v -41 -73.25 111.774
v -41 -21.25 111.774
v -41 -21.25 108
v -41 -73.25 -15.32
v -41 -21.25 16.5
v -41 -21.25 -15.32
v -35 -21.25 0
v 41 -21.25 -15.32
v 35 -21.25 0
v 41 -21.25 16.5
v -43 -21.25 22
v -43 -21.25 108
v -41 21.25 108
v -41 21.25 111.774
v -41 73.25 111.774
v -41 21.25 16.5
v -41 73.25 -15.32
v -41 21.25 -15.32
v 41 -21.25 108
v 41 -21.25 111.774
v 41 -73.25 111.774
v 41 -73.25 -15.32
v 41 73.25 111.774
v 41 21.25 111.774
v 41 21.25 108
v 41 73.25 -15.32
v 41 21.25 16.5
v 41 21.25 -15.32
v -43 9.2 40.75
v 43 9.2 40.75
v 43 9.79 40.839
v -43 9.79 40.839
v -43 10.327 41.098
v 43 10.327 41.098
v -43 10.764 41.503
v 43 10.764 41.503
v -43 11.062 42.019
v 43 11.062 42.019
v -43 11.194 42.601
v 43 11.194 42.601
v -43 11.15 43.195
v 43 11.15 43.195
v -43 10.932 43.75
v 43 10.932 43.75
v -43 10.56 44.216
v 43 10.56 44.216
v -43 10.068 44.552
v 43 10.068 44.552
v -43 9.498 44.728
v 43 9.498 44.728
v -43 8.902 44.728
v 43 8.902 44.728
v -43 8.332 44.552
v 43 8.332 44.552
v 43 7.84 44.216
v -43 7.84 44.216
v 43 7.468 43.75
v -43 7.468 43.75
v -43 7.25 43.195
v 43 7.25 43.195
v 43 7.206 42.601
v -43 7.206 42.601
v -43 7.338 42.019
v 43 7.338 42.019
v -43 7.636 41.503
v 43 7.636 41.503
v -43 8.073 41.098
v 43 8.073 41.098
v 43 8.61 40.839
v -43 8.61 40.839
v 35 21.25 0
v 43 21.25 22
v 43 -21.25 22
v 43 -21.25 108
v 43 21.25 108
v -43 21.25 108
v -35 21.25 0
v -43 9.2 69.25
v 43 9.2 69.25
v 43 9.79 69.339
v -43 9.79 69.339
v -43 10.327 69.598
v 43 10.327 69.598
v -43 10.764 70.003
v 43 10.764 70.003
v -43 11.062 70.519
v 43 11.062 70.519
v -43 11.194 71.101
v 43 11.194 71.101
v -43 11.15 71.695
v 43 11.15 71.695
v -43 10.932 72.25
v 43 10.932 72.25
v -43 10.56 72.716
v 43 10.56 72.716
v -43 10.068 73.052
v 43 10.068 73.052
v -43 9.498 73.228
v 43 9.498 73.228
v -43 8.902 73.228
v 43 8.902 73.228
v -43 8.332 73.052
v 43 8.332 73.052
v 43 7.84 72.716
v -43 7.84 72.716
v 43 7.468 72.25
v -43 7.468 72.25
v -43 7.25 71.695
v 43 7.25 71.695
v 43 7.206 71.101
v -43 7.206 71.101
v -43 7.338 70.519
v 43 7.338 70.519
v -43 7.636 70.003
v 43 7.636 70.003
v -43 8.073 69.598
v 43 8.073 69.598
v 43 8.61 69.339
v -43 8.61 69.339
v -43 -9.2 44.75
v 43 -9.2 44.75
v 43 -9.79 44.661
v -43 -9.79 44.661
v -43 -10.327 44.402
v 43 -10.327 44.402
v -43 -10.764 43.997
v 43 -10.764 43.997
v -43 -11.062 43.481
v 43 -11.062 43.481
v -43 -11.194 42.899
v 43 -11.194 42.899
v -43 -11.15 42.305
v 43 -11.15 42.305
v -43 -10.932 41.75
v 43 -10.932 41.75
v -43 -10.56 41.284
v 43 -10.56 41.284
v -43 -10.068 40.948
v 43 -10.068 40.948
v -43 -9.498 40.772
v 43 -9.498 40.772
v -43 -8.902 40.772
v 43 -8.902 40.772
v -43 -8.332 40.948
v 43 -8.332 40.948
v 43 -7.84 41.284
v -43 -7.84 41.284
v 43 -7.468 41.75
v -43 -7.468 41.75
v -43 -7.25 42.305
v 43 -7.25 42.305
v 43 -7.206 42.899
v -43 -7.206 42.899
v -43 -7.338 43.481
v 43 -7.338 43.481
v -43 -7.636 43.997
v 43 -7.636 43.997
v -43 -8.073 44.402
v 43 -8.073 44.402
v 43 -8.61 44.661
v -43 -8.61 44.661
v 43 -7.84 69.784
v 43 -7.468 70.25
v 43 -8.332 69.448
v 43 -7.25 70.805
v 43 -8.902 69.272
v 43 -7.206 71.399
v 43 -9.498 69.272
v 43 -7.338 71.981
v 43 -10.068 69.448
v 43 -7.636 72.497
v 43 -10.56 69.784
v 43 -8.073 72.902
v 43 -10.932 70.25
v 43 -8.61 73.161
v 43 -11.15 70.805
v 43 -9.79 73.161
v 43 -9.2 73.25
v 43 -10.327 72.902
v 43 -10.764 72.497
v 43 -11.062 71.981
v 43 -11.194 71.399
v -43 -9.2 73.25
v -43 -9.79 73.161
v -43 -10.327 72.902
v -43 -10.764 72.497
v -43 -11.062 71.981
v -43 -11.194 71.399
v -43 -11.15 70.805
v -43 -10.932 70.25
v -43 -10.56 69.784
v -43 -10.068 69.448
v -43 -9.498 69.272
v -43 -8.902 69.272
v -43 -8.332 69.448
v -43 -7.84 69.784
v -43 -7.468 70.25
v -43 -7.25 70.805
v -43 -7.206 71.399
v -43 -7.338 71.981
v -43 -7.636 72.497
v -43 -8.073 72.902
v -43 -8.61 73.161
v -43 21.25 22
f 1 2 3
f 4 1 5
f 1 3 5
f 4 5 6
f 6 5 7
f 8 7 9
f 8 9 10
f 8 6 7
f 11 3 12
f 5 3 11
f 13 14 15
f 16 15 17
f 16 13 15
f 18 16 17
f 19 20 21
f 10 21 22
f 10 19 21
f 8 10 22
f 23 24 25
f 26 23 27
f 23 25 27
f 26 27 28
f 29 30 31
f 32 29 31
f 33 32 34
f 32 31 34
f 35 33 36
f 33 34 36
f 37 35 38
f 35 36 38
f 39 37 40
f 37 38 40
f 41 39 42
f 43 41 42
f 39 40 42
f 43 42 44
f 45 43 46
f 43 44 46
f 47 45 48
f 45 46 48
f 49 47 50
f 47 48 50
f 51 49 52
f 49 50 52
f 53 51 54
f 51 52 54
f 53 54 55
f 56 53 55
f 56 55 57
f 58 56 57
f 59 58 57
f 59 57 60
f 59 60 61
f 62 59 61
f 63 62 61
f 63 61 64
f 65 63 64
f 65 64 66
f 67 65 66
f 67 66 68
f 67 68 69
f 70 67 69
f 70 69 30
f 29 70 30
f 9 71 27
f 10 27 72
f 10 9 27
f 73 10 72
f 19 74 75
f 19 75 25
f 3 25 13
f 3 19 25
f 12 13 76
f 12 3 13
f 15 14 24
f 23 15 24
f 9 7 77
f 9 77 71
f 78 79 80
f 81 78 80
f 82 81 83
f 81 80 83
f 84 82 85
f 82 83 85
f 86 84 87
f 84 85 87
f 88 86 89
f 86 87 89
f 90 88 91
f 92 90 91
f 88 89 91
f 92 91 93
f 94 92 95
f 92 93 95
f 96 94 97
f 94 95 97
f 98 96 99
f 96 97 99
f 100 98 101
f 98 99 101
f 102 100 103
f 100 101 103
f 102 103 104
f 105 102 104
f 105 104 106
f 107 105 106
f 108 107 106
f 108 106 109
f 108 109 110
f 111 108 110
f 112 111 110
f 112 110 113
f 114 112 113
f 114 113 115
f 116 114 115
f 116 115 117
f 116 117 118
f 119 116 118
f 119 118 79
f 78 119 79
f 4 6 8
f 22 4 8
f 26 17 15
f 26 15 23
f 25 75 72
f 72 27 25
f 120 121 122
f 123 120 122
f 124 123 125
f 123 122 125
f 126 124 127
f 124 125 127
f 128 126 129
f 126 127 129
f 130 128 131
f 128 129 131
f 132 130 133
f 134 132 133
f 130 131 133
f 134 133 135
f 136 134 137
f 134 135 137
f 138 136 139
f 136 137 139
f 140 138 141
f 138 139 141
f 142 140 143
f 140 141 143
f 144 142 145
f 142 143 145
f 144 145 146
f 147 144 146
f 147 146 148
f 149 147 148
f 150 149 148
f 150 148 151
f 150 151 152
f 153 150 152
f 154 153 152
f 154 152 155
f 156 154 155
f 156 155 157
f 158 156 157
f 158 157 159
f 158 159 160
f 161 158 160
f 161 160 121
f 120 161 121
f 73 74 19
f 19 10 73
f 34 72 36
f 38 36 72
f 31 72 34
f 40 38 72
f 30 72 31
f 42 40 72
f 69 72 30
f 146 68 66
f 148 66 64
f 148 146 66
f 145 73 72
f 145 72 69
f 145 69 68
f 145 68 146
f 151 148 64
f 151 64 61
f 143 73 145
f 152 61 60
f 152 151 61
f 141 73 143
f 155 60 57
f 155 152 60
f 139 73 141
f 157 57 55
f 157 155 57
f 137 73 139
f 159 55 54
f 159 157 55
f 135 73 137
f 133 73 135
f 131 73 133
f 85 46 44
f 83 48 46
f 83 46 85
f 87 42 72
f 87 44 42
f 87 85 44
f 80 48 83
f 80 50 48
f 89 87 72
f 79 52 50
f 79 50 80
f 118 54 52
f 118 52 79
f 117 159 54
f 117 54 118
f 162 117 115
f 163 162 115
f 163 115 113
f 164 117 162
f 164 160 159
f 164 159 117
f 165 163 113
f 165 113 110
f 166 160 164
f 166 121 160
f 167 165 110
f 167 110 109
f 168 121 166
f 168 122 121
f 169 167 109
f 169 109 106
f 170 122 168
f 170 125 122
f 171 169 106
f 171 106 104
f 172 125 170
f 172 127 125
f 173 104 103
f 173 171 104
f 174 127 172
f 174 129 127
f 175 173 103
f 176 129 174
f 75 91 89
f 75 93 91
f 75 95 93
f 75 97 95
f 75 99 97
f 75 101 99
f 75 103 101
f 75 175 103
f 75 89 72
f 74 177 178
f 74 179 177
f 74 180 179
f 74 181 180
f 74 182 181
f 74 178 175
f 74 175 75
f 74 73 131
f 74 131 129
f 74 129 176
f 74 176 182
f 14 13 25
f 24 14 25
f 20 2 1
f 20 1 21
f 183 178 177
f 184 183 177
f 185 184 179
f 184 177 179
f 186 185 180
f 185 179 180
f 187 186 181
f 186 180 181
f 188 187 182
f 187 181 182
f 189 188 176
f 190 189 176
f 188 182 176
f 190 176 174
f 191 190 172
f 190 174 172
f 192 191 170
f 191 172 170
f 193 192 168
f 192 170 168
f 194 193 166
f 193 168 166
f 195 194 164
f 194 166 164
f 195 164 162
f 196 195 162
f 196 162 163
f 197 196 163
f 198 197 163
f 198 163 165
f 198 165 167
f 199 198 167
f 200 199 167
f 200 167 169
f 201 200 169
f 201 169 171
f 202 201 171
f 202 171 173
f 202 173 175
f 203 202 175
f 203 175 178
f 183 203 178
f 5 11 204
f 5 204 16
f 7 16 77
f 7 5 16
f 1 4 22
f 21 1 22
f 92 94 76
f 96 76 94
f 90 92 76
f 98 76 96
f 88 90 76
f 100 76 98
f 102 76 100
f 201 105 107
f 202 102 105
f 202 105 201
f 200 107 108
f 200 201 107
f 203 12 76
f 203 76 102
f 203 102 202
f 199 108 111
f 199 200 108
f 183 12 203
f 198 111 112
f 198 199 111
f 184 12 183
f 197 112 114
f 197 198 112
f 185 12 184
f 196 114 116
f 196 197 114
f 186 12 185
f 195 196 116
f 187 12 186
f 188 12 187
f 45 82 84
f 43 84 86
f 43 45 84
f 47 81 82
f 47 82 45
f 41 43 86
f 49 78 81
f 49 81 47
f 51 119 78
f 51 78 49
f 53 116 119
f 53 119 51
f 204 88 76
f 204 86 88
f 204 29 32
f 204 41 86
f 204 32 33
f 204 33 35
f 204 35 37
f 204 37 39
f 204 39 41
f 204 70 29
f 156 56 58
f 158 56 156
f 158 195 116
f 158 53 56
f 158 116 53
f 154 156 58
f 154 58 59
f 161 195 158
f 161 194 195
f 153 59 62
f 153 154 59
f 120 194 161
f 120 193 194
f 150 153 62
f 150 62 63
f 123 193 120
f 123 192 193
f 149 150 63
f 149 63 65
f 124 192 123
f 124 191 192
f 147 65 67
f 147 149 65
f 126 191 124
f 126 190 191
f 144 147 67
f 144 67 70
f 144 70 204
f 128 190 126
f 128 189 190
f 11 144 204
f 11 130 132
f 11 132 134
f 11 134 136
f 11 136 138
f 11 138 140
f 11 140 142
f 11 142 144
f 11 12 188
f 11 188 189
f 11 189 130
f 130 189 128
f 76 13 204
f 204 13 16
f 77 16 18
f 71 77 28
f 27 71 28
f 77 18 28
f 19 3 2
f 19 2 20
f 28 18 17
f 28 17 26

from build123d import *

# Parameters (mm, degrees)
BOSS_EXTRUDE1_DEPTH      = 21.25
BOSS_EXTRUDE1_DEPTH_BACK = 21.25
SKETCH2_R                = 2
CUT_EXTRUDE1_DEPTH       = 140.683794694
SKETCH3_W                = 82
SKETCH3_H                = 127.094201992
BOSS_EXTRUDE2_DEPTH      = 52


with BuildPart() as part:
    # Sketch1 → Boss-Extrude1 (new, two sides: drawn at the far end of the back side and taken through both)
    with BuildSketch(Plane(origin=(0, 0, 0), x_dir=(1, 0, 0), z_dir=(0, 1, 0)).offset(-BOSS_EXTRUDE1_DEPTH_BACK)):
        Polygon((-43, -22), (-35, 0), (35, 0), (43, -22), (43, -108), (-43, -108), align=None)
    extrude(amount=BOSS_EXTRUDE1_DEPTH + BOSS_EXTRUDE1_DEPTH_BACK)

    # Sketch2 → Cut-Extrude1 (cut, through all)
    with BuildSketch(Plane(origin=(43, 0, 0), x_dir=(0, 0, -1), z_dir=(1, 0, 0))):
        with Locations((-71.25, 9.2)):
            Circle(SKETCH2_R)
        with Locations((-42.75, 9.2)):
            Circle(SKETCH2_R)
        with Locations((-42.75, -9.2)):
            Circle(SKETCH2_R)
        with Locations((-71.25, -9.2)):
            Circle(SKETCH2_R)
    extrude(amount=-CUT_EXTRUDE1_DEPTH, mode=Mode.SUBTRACT)

    # Sketch3 → Boss-Extrude2 (add)
    with BuildSketch(Plane(origin=(0, 21.25, 0), x_dir=(1, 0, 0), z_dir=(0, 1, 0))):
        with Locations((0, -48.227100996)):
            Rectangle(SKETCH3_W, SKETCH3_H)
    boss_extrude2 = extrude(amount=BOSS_EXTRUDE2_DEPTH)

    # Mirror1: Boss-Extrude2 across plane
    add(boss_extrude2.mirror(Plane.ZX))


solid = part.part
